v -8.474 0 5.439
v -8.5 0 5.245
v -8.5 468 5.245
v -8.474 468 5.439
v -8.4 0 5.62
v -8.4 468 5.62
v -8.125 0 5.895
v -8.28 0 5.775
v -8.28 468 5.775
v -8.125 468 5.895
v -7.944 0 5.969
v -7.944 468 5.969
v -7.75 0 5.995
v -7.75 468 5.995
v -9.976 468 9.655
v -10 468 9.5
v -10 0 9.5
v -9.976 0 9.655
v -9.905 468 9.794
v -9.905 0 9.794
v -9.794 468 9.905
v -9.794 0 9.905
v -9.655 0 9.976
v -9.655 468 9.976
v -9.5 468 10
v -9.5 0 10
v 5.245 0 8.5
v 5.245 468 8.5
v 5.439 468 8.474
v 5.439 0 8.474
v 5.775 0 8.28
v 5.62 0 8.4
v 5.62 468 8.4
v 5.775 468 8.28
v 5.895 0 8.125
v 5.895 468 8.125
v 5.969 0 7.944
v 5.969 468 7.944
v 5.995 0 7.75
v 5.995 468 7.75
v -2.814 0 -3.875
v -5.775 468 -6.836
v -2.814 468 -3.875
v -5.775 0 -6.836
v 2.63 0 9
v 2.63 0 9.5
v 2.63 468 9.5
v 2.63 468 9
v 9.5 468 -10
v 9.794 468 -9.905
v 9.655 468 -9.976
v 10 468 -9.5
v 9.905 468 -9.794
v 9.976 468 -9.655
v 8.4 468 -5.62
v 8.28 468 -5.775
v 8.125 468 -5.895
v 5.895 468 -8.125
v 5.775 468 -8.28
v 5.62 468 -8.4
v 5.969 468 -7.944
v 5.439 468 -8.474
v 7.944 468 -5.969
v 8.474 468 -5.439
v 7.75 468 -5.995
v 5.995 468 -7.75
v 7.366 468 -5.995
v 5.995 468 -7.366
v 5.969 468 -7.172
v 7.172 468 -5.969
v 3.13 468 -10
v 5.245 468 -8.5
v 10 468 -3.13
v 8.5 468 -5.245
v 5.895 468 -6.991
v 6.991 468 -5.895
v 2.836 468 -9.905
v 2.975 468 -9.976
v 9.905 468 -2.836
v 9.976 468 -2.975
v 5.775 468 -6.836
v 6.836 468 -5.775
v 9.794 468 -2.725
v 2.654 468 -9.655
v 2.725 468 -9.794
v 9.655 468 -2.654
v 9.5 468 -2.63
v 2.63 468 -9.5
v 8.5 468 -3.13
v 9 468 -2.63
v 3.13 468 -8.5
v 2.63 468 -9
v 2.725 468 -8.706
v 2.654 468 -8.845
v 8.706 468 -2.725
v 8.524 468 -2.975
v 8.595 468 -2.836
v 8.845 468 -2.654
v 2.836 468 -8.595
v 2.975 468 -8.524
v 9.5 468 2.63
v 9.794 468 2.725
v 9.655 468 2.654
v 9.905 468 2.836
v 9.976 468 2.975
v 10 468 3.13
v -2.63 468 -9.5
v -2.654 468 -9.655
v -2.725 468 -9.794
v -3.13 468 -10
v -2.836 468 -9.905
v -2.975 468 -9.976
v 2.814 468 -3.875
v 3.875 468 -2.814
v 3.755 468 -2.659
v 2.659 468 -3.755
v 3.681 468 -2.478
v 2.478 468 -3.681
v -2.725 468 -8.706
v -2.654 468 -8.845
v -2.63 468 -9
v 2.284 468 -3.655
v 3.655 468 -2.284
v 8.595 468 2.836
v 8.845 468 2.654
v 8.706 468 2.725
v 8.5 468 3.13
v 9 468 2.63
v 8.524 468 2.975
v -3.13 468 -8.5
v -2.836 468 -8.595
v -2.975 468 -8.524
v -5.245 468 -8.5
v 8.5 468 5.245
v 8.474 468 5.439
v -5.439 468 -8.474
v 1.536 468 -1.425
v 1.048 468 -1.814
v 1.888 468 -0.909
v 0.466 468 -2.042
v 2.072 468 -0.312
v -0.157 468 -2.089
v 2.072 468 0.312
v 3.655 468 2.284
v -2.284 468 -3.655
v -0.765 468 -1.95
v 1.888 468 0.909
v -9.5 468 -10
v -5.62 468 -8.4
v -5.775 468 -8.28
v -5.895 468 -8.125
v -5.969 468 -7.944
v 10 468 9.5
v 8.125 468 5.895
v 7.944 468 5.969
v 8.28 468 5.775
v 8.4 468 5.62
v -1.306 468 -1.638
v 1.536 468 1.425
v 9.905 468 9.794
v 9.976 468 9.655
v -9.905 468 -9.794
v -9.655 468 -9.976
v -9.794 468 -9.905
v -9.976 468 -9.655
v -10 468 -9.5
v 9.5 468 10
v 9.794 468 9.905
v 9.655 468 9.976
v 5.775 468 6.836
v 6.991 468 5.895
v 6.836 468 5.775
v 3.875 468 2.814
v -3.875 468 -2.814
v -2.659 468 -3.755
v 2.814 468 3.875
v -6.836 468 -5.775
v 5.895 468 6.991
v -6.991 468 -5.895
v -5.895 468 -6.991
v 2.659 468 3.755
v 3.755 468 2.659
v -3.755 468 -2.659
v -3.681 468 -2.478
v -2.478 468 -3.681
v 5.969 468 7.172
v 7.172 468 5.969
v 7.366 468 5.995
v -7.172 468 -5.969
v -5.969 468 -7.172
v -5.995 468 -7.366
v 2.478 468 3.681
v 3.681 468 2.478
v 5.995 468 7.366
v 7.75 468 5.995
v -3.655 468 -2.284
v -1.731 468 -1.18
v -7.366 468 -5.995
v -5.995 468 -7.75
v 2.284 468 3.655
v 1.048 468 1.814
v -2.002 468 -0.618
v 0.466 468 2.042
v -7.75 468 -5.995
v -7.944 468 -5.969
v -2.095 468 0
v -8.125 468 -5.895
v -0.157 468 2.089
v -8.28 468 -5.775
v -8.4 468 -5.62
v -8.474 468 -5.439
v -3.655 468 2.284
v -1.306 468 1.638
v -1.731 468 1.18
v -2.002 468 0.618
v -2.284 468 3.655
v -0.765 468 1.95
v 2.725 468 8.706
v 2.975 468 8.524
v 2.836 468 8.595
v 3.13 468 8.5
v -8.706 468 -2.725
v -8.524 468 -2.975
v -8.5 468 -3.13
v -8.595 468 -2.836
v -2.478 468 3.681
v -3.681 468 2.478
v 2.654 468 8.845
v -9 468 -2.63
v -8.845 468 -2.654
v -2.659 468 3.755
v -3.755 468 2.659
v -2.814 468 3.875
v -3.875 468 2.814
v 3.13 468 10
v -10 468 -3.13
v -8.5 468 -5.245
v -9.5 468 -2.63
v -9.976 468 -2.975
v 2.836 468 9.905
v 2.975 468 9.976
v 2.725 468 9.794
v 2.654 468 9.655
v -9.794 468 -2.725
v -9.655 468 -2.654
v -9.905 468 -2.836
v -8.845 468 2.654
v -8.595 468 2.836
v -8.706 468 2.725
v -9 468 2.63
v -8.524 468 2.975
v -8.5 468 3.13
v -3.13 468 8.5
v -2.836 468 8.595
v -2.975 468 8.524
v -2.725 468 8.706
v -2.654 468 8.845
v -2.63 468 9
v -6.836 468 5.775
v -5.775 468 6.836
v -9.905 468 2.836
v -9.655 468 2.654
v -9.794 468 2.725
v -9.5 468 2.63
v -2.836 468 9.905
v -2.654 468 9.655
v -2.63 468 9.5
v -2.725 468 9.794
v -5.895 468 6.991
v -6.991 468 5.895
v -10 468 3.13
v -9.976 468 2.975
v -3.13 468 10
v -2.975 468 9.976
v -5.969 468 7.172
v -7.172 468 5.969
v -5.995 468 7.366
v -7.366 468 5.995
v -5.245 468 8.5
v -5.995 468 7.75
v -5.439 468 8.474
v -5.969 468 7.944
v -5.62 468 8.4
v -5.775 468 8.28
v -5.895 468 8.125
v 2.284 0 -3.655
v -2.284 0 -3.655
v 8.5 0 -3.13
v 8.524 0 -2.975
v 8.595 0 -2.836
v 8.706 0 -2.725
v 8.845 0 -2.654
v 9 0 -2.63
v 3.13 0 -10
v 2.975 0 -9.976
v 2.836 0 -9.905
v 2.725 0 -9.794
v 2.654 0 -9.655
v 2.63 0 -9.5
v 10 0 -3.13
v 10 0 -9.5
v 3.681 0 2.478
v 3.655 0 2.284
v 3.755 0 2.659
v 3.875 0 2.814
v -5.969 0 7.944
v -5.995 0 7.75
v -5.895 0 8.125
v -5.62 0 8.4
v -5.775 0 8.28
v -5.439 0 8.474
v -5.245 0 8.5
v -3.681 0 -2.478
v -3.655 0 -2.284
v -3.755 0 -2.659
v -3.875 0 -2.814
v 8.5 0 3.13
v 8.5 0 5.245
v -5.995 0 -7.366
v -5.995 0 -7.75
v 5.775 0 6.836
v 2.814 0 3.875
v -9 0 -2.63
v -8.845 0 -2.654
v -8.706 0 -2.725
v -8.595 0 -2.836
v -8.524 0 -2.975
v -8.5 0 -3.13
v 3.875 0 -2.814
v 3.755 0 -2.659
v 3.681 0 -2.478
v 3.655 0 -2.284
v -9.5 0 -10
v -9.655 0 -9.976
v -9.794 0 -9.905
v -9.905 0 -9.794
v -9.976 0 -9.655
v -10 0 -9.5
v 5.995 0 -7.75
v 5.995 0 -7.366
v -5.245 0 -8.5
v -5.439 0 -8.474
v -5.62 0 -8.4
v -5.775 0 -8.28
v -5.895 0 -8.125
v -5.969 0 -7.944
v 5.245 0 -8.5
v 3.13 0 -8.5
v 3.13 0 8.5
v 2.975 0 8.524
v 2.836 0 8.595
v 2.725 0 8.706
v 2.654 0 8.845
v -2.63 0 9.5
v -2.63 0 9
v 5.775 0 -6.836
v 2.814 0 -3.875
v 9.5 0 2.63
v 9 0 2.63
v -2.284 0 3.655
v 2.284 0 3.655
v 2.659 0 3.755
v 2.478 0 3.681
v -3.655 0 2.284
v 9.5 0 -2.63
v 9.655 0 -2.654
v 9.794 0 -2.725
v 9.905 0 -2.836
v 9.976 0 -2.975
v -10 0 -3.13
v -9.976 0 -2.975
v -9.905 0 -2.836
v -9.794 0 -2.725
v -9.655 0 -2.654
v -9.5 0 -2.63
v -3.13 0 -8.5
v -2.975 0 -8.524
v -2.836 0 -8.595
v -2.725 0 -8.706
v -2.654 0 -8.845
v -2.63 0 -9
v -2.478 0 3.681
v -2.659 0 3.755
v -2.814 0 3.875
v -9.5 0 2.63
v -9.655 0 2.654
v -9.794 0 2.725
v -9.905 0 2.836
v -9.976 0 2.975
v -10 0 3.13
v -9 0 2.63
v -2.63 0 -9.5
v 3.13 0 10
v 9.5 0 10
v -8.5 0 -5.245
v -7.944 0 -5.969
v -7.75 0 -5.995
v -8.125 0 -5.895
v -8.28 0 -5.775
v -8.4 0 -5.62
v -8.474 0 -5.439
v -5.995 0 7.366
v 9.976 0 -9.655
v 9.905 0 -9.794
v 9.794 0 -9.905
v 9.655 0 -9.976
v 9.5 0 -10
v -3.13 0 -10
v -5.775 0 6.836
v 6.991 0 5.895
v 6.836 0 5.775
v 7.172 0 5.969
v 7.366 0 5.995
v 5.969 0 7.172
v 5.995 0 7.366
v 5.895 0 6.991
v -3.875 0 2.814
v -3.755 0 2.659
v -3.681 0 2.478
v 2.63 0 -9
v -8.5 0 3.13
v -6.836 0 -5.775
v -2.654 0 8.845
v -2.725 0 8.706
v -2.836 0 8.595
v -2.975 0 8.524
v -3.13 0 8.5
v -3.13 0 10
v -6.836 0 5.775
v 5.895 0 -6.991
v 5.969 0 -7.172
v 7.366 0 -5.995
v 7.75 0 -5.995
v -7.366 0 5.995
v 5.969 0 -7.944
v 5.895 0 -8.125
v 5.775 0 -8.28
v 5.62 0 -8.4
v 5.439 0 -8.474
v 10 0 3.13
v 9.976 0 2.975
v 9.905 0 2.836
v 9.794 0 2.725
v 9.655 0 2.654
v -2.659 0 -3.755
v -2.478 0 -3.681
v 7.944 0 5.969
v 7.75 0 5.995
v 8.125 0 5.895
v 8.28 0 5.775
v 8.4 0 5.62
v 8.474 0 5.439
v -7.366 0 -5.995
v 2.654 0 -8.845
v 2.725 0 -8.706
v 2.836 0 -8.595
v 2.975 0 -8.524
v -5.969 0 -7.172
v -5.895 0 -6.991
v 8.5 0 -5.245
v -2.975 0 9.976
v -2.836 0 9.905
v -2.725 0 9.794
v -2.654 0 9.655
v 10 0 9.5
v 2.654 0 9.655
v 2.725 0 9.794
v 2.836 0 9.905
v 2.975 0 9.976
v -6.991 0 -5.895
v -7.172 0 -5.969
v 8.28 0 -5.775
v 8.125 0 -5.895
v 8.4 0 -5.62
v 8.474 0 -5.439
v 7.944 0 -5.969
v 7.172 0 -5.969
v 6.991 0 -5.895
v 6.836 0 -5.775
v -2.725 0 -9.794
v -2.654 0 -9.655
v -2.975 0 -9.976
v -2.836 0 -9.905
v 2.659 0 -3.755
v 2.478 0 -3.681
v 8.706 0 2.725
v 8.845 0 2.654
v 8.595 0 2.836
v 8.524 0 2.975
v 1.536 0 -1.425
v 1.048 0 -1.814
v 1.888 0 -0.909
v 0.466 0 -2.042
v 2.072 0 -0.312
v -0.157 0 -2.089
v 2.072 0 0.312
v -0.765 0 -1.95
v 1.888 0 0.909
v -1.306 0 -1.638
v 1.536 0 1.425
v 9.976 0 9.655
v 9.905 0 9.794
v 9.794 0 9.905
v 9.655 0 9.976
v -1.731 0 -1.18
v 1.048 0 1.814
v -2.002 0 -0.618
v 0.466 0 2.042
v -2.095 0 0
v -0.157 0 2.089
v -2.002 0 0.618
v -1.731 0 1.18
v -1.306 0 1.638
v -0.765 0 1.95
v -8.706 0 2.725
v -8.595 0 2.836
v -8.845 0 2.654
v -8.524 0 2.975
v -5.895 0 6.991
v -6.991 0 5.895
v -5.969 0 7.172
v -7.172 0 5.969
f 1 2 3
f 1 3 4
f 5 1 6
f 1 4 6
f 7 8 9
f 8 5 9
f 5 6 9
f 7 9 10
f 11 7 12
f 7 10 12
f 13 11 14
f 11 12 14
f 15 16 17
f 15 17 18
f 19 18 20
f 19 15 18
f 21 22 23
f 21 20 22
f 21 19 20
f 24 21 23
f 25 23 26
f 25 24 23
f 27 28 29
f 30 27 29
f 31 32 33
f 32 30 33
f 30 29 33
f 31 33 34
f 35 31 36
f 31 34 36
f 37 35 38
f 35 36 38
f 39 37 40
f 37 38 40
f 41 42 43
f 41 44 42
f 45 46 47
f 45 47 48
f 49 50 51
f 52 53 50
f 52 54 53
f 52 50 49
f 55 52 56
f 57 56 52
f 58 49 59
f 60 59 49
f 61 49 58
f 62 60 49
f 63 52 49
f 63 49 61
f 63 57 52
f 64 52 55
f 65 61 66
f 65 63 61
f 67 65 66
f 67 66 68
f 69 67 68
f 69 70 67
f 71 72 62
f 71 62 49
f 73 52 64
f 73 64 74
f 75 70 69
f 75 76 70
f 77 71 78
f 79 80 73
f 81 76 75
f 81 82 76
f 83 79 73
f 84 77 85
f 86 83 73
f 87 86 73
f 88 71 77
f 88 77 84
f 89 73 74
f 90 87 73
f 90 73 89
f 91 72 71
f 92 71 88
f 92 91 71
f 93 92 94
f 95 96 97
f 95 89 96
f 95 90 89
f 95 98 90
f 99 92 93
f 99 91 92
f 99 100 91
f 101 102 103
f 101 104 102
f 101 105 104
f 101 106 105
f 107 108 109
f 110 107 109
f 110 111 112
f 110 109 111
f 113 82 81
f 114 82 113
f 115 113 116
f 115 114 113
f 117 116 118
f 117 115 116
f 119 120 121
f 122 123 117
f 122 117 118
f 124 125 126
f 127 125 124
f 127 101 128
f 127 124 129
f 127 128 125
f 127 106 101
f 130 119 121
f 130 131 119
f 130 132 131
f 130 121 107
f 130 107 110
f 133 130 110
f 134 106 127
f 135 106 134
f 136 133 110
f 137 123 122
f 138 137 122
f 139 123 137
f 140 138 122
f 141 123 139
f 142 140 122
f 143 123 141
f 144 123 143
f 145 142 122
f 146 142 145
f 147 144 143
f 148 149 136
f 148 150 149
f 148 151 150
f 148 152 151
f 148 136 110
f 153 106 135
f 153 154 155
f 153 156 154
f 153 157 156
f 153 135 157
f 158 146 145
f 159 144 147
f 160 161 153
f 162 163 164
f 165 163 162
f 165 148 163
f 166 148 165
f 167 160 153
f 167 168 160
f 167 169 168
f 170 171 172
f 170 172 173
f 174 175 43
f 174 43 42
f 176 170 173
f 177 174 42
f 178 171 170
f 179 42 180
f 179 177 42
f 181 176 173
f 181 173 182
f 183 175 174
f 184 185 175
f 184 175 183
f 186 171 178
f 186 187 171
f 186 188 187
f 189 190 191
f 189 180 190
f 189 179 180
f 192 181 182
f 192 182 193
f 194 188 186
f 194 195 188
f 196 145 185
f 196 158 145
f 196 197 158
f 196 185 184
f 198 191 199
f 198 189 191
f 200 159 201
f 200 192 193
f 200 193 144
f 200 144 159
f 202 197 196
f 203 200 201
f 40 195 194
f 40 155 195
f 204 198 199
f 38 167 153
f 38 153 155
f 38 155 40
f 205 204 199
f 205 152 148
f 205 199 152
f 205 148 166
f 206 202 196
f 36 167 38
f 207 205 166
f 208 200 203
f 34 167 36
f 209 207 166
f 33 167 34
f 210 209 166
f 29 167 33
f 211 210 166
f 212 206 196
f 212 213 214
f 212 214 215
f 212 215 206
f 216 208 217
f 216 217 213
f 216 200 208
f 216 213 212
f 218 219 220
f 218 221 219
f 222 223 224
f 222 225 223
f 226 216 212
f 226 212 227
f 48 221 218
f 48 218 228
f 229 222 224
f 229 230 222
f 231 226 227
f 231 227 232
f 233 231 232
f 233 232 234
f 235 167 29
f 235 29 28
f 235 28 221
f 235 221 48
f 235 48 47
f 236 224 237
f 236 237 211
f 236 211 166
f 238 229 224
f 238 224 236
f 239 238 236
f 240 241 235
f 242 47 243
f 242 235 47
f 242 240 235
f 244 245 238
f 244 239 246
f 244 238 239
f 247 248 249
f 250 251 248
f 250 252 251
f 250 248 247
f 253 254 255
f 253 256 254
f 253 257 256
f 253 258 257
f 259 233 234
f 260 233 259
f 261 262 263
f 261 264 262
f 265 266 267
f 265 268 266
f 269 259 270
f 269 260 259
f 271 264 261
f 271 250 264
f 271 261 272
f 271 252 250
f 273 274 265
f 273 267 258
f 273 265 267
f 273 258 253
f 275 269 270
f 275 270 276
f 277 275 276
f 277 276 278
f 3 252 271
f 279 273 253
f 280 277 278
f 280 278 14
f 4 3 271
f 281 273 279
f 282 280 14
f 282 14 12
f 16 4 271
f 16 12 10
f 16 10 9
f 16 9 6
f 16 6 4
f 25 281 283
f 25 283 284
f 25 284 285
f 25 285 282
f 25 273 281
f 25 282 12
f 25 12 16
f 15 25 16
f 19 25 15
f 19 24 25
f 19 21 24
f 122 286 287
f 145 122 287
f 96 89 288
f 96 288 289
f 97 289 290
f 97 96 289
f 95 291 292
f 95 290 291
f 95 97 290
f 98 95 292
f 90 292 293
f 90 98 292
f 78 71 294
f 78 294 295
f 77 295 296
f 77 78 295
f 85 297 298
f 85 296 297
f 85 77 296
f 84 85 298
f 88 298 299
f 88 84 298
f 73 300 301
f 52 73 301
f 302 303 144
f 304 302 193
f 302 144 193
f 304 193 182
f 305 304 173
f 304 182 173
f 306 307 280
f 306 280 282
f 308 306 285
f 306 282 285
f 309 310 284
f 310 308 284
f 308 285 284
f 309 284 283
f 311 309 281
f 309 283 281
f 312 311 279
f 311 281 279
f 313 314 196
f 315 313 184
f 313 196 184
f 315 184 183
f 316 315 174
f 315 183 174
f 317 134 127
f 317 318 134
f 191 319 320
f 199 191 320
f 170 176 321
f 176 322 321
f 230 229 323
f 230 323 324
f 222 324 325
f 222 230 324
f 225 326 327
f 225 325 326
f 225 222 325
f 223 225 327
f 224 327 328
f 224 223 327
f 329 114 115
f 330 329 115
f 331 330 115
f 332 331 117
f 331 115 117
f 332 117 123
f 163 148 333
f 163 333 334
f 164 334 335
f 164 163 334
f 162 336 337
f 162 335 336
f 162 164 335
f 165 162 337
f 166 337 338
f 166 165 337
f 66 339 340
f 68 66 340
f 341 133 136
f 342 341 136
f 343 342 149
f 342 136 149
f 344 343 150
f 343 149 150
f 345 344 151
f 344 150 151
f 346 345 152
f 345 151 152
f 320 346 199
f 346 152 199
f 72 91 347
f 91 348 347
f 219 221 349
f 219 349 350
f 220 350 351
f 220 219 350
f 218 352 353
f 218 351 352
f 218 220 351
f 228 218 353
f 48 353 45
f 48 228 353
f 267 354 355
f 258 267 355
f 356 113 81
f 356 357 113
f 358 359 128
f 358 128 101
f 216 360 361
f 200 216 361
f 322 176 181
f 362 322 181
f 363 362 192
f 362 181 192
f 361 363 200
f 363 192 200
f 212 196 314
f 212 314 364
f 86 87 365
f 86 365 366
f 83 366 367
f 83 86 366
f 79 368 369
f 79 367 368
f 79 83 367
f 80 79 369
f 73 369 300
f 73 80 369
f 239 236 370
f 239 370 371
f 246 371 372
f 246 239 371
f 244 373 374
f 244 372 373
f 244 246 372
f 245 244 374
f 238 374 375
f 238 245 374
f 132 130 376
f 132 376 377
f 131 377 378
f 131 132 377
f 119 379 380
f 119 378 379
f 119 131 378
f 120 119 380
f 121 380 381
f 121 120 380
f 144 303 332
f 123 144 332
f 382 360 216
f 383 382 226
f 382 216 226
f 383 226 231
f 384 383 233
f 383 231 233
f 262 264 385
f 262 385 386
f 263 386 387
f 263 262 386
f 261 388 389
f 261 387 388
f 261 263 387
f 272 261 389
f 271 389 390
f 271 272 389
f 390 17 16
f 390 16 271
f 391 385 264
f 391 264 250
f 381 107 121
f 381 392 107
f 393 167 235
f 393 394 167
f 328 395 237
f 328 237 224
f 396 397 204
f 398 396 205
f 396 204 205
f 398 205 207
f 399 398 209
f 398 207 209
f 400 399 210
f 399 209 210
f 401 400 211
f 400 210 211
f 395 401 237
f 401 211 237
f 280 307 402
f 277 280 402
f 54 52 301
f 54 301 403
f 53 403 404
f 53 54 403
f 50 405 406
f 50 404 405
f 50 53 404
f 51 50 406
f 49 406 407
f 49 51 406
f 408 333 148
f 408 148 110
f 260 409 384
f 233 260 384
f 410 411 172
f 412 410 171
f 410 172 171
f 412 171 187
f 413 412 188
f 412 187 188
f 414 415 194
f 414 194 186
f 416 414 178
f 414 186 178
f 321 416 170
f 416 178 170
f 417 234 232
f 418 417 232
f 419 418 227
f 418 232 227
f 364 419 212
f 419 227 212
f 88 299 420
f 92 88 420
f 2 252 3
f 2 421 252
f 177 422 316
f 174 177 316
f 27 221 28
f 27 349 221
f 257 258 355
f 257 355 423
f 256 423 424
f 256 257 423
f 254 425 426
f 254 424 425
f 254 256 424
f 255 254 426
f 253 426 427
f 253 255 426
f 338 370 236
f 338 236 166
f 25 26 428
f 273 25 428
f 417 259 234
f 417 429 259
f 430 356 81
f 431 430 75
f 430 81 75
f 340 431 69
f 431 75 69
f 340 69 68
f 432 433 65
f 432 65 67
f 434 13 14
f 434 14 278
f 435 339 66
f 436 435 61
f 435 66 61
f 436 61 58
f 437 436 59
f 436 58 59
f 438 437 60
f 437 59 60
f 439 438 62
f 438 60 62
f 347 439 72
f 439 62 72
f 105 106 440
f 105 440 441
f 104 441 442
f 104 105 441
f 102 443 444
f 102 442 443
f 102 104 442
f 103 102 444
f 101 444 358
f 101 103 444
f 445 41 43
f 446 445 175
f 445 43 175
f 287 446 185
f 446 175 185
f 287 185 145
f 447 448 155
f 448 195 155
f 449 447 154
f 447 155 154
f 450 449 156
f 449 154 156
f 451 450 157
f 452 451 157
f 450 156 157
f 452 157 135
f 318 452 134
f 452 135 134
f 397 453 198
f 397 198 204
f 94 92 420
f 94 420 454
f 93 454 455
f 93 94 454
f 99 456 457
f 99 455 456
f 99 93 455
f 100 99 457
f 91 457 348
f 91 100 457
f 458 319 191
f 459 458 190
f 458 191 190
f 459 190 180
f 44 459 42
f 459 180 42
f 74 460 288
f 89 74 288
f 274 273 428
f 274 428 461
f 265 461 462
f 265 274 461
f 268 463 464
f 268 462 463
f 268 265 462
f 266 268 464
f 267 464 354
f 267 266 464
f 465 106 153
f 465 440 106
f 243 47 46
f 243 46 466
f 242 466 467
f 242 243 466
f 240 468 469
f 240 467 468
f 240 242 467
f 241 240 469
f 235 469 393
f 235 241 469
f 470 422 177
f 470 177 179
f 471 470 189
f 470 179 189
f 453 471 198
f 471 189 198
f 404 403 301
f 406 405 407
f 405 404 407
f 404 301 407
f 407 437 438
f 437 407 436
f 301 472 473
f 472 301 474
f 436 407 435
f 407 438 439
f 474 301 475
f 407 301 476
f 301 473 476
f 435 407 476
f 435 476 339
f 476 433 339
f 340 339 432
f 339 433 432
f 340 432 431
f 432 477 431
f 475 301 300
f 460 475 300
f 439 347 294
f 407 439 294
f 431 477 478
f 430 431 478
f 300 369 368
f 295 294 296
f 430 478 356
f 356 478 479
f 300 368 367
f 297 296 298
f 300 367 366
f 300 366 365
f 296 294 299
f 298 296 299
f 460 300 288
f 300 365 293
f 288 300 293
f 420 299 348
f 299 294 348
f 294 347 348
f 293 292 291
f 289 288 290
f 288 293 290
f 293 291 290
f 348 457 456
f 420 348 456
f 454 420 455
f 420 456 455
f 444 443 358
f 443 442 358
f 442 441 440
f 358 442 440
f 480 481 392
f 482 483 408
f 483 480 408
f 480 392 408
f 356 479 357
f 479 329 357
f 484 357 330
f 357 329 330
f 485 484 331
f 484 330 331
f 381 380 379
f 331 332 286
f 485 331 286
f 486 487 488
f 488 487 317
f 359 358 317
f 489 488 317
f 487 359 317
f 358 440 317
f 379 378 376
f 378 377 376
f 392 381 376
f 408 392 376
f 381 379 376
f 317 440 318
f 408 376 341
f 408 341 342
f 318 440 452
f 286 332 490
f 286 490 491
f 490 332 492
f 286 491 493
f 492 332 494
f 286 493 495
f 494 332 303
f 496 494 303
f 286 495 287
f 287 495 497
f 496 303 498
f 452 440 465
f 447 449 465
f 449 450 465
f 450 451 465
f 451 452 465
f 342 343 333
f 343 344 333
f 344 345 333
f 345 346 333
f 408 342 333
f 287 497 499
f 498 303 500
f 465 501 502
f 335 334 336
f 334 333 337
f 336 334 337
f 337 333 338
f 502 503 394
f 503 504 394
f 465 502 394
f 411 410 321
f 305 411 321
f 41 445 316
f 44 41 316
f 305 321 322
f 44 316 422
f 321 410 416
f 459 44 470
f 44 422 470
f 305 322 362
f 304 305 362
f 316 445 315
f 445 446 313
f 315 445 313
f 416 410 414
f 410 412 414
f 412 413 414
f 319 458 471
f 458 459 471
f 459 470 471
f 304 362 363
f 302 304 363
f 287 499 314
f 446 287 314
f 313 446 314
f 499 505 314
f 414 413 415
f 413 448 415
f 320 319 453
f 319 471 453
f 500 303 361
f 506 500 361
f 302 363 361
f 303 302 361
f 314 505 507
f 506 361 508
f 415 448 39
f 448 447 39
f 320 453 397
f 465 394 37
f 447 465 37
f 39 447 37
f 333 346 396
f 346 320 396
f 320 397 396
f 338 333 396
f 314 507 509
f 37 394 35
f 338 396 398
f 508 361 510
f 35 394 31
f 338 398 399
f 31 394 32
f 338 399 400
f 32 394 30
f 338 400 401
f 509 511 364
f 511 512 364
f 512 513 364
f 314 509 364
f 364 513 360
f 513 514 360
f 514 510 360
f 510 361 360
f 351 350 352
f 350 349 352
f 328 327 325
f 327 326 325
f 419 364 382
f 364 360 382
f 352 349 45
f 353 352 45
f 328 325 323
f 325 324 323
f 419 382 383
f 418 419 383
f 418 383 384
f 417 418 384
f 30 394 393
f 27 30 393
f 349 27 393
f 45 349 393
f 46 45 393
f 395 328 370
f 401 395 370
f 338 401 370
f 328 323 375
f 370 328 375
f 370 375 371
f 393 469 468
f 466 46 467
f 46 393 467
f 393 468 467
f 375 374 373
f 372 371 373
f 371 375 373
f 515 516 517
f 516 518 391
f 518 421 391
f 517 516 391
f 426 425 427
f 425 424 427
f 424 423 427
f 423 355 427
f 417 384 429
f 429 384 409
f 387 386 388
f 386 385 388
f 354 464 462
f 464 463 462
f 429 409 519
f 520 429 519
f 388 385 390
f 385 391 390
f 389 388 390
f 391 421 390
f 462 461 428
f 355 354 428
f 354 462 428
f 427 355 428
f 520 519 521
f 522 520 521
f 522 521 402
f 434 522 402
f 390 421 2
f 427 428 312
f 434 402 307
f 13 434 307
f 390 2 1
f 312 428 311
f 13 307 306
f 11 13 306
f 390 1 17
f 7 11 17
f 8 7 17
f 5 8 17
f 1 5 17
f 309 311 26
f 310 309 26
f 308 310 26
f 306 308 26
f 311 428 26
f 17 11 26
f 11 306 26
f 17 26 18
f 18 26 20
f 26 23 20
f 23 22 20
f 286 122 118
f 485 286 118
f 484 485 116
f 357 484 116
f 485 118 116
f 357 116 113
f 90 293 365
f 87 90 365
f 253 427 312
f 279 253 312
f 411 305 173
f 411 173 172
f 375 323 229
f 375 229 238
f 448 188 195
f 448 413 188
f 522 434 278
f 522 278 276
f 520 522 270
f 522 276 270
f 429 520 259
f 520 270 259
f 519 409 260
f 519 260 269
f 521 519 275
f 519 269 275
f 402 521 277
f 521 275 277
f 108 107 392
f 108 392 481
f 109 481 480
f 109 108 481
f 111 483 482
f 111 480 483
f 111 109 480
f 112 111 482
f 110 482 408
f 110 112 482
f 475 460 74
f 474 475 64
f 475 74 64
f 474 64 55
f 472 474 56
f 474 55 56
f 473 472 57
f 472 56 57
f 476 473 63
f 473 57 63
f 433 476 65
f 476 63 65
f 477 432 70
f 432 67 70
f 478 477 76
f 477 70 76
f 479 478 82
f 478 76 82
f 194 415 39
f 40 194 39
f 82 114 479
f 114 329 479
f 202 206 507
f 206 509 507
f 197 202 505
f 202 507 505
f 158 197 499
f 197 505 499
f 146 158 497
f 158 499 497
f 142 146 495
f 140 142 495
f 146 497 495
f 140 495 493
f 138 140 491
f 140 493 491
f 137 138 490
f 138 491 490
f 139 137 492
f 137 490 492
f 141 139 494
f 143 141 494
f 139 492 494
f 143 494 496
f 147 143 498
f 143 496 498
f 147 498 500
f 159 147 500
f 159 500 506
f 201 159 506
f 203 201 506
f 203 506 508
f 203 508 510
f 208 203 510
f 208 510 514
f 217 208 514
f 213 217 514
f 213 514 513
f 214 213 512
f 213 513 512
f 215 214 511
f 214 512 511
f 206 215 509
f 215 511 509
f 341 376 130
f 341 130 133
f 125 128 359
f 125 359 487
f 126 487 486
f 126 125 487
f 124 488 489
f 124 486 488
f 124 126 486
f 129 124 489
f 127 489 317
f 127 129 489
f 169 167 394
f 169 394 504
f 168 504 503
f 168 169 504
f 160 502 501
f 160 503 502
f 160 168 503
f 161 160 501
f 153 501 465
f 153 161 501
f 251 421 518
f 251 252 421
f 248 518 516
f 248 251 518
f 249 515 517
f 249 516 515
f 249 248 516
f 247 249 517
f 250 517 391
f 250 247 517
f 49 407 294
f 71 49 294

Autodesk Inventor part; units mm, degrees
ref_plane "YZ Plane" through (0, 0, 0) normal (1, 0, 0) x (0, 1, 0)
ref_plane "XZ Plane" through (0, 0, 0) normal (0, 1, 0) x (-1, 0, 0)
ref_plane "XY Plane" through (0, 0, 0) normal (0, 0, 1) x (1, 0, 0)
sketch "Sketch1" plane through (0, 0, 0) normal (0, 1, 0) x (-1, 0, 0)
  line L0 (0, -14) -> (0, 14) projected
  line L1 (-14, 0) -> (14, 0) projected
  line L2 (14, 0) -> (-14, 0) projected
  line L3 (0, -14) -> (0, 14) projected
  line L4 (2.5943, 3.655) -> (-2.5943, 3.655)
  line L5 (-3.655, 2.5943) -> (-3.655, -2.5943)
  line L6 (-2.5943, -3.655) -> (2.5943, -3.655)
  line L7 (3.655, -2.5943) -> (3.655, 2.5943)
  line L8 (-3.655, 3.655) -> (3.655, -3.655) construction
  line L9 (10, 10) -> (10, 2.63)
  line L10 (10, 2.63) -> (8.5, 2.63)
  line L11 (10, 10) -> (2.63, 10)
  line L12 (2.63, 10) -> (2.63, 8.5)
  line L13 (-10, 10) -> (-2.63, 10)
  line L14 (-2.63, 10) -> (-2.63, 8.5)
  line L15 (-10, 8.5) -> (-10, 10)
  line L16 (-10, 10) -> (-8.5, 10)
  line L17 (-8.5, 2.63) -> (-10, 2.63)
  line L18 (-10, 2.63) -> (-10, 10)
  line L19 (-10, -10) -> (-8.5, -10)
  line L20 (-8.5, -2.63) -> (-10, -2.63)
  line L21 (-10, -2.63) -> (-10, -10)
  line L22 (-10, -10) -> (-2.63, -10)
  line L23 (-2.63, -10) -> (-2.63, -8.5)
  line L24 (-10, -8.5) -> (-10, -10)
  line L25 (10, -10) -> (8.5, -10)
  line L26 (8.5, -2.63) -> (10, -2.63)
  line L27 (10, -2.63) -> (10, -10)
  line L28 (10, -10) -> (2.63, -10)
  line L29 (2.63, -10) -> (2.63, -8.5)
  line L30 (10, -8.5) -> (10, -10)
  circle A0 centre (0, 0) radius 2.095
  line L31 (5.995, -10) -> (2.63, -10)
  line L32 (-2.63, -10) -> (-5.995, -10)
  line L33 (10, -10) -> (2.63, -10)
  line L34 (-2.63, -10) -> (-10, -10)
  line L35 (10, -5.995) -> (10, -2.63)
  line L36 (10, 2.63) -> (10, 5.995)
  line L37 (10, 10) -> (10, 2.63)
  line L38 (10, -2.63) -> (10, -10)
  line L39 (-5.995, 10) -> (-2.63, 10)
  line L40 (2.63, 10) -> (5.995, 10)
  line L41 (-10, 10) -> (-2.63, 10)
  line L42 (2.63, 10) -> (10, 10)
  line L43 (-10, 5.995) -> (-10, 2.63)
  line L44 (-10, -2.63) -> (-10, -5.995)
  line L45 (-10, -10) -> (-10, -2.63)
  line L46 (-10, 2.63) -> (-10, 10)
  line L47 (-2.63, -8.5) -> (-5.995, -8.5)
  line L48 (-8.5, -5.995) -> (-8.5, -2.63)
  line L49 (-8.5, -5.995) -> (-7.0557, -5.995)
  line L50 (-5.995, -8.5) -> (-5.995, -7.0557)
  line L51 (-5.995, 7.0557) -> (-5.995, 8.5)
  line L52 (2.63, 8.5) -> (5.995, 8.5)
  line L53 (8.5, 2.63) -> (8.5, 5.995)
  line L54 (8.5, 5.995) -> (7.0557, 5.995)
  line L55 (5.995, 8.5) -> (5.995, 7.0557)
  line L56 (2.63, -8.5) -> (5.995, -8.5)
  line L57 (9.5607, -8.5) -> (10, -8.5)
  line L58 (8.5, -10) -> (8.5, -9.5607)
  line L59 (8.5, -5.995) -> (8.5, -2.63)
  line L60 (7.0557, -5.995) -> (8.5, -5.995)
  line L61 (5.995, -7.0557) -> (5.995, -8.5)
  line L62 (3.655, 3.655) -> (-0.5303, -0.5303) construction
  line L63 (-1.4814, -1.4814) -> (-3.655, -3.655) construction
  line L64 (-8.5, 10) -> (-8.5, 9.5607)
  line L65 (-8.5, 5.995) -> (-8.5, 2.63)
  line L66 (-2.63, 8.5) -> (-5.995, 8.5)
  line L67 (-9.5607, 8.5) -> (-10, 8.5)
  line L68 (-7.0557, 5.995) -> (-8.5, 5.995)
  line L69 (-3.655, 2.5943) -> (-7.0557, 5.995)
  line L70 (-2.5943, 3.655) -> (-5.995, 7.0557)
  line L71 (5.995, 7.0557) -> (2.5943, 3.655)
  line L72 (7.0557, 5.995) -> (3.655, 2.5943)
  line L73 (7.0557, -5.995) -> (3.655, -2.5943)
  line L74 (5.995, -7.0557) -> (2.5943, -3.655)
  line L75 (-2.5943, -3.655) -> (-5.995, -7.0557)
  line L76 (-3.655, -2.5943) -> (-7.0557, -5.995)
  dimension "d26" = 4.19
  dimension "d0" = 20
  dimension "d1" = 20
  dimension "d2" = 7.31
  dimension "d3" = 7.31
  dimension "d4" = 20
  dimension "d5" = 11.99
  dimension "d6" = 11.99
  dimension "d11" = 7.37
  dimension "d12" = 1.5
  dimension "d13" = 7.37
  dimension "d14" = 1.5
  dimension "d15" = 7.37
  dimension "d16" = 1.5
  dimension "d17" = 7.37
  dimension "d18" = 1.5
  dimension "d19" = 7.37
  dimension "d20" = 7.37
  dimension "d21" = 1.5
  dimension "d22" = 1.5
  dimension "d23" = 7.37
  dimension "d24" = 7.37
  dimension "d25" = 1.5
extrude "Extrusion1" add sketch "Sketch1" along normal blind 468 contours L6 L75 L50 L47 L23 L22 L19 L21 L20 L48 L49 L76 L5 L1 A0 L0 | L0 A0 L1 L7 L73 L60 L59 L26 L27 L25 L28 L29 L56 L61 L74 L6 | L1 L5 L69 L68 L65 L17 L18 L15 L13 L14 L66 L51 L70 L4 L0 A0 | A0 L0 L4 L71 L55 L52 L12 L11 L9 L10 L53 L54 L72 L7 L1
fillet "Fillet1" radius 0.5 20 edges at (10, 234, 10) (2.63, 234, 10) (-2.63, 234, 10) (-2.63, 234, 8.5) (10, 234, 2.63) (8.5, 234, 2.63) (10, 234, -2.63) (8.5, 234, -2.63) (10, 234, -10) (2.63, 234, -8.5) (-2.63, 234, -10) (-2.63, 234, -8.5) (2.63, 234, -10) (-10, 234, -10) (-8.5, 234, -2.63) (-10, 234, -2.63) (-8.5, 234, 2.63) (-10, 234, 2.63) (-10, 234, 10) (2.63, 234, 8.5)
fillet "Fillet2" radius 0.75 24 edges at (-7.0557, 234, 5.995) (-3.655, 234, 2.5943) (-8.5, 234, -5.995) (-7.0557, 234, -5.995) (-5.995, 234, -8.5) (3.655, 234, -2.5943) (7.0557, 234, -5.995) (-2.5943, 234, 3.655) (-5.995, 234, 7.0557) (3.655, 234, 2.5943) (7.0557, 234, 5.995) (8.5, 234, 5.995) (8.5, 234, -5.995) (2.5943, 234, 3.655) (5.995, 234, 7.0557) (5.995, 234, 8.5) (-5.995, 234, 8.5) (-8.5, 234, 5.995) (2.5943, 234, -3.655) (5.995, 234, -7.0557) (5.995, 234, -8.5) (-5.995, 234, -7.0557) (-2.5943, 234, -3.655) (-3.655, 234, -2.5943)
properties part number "pro20ininside"
